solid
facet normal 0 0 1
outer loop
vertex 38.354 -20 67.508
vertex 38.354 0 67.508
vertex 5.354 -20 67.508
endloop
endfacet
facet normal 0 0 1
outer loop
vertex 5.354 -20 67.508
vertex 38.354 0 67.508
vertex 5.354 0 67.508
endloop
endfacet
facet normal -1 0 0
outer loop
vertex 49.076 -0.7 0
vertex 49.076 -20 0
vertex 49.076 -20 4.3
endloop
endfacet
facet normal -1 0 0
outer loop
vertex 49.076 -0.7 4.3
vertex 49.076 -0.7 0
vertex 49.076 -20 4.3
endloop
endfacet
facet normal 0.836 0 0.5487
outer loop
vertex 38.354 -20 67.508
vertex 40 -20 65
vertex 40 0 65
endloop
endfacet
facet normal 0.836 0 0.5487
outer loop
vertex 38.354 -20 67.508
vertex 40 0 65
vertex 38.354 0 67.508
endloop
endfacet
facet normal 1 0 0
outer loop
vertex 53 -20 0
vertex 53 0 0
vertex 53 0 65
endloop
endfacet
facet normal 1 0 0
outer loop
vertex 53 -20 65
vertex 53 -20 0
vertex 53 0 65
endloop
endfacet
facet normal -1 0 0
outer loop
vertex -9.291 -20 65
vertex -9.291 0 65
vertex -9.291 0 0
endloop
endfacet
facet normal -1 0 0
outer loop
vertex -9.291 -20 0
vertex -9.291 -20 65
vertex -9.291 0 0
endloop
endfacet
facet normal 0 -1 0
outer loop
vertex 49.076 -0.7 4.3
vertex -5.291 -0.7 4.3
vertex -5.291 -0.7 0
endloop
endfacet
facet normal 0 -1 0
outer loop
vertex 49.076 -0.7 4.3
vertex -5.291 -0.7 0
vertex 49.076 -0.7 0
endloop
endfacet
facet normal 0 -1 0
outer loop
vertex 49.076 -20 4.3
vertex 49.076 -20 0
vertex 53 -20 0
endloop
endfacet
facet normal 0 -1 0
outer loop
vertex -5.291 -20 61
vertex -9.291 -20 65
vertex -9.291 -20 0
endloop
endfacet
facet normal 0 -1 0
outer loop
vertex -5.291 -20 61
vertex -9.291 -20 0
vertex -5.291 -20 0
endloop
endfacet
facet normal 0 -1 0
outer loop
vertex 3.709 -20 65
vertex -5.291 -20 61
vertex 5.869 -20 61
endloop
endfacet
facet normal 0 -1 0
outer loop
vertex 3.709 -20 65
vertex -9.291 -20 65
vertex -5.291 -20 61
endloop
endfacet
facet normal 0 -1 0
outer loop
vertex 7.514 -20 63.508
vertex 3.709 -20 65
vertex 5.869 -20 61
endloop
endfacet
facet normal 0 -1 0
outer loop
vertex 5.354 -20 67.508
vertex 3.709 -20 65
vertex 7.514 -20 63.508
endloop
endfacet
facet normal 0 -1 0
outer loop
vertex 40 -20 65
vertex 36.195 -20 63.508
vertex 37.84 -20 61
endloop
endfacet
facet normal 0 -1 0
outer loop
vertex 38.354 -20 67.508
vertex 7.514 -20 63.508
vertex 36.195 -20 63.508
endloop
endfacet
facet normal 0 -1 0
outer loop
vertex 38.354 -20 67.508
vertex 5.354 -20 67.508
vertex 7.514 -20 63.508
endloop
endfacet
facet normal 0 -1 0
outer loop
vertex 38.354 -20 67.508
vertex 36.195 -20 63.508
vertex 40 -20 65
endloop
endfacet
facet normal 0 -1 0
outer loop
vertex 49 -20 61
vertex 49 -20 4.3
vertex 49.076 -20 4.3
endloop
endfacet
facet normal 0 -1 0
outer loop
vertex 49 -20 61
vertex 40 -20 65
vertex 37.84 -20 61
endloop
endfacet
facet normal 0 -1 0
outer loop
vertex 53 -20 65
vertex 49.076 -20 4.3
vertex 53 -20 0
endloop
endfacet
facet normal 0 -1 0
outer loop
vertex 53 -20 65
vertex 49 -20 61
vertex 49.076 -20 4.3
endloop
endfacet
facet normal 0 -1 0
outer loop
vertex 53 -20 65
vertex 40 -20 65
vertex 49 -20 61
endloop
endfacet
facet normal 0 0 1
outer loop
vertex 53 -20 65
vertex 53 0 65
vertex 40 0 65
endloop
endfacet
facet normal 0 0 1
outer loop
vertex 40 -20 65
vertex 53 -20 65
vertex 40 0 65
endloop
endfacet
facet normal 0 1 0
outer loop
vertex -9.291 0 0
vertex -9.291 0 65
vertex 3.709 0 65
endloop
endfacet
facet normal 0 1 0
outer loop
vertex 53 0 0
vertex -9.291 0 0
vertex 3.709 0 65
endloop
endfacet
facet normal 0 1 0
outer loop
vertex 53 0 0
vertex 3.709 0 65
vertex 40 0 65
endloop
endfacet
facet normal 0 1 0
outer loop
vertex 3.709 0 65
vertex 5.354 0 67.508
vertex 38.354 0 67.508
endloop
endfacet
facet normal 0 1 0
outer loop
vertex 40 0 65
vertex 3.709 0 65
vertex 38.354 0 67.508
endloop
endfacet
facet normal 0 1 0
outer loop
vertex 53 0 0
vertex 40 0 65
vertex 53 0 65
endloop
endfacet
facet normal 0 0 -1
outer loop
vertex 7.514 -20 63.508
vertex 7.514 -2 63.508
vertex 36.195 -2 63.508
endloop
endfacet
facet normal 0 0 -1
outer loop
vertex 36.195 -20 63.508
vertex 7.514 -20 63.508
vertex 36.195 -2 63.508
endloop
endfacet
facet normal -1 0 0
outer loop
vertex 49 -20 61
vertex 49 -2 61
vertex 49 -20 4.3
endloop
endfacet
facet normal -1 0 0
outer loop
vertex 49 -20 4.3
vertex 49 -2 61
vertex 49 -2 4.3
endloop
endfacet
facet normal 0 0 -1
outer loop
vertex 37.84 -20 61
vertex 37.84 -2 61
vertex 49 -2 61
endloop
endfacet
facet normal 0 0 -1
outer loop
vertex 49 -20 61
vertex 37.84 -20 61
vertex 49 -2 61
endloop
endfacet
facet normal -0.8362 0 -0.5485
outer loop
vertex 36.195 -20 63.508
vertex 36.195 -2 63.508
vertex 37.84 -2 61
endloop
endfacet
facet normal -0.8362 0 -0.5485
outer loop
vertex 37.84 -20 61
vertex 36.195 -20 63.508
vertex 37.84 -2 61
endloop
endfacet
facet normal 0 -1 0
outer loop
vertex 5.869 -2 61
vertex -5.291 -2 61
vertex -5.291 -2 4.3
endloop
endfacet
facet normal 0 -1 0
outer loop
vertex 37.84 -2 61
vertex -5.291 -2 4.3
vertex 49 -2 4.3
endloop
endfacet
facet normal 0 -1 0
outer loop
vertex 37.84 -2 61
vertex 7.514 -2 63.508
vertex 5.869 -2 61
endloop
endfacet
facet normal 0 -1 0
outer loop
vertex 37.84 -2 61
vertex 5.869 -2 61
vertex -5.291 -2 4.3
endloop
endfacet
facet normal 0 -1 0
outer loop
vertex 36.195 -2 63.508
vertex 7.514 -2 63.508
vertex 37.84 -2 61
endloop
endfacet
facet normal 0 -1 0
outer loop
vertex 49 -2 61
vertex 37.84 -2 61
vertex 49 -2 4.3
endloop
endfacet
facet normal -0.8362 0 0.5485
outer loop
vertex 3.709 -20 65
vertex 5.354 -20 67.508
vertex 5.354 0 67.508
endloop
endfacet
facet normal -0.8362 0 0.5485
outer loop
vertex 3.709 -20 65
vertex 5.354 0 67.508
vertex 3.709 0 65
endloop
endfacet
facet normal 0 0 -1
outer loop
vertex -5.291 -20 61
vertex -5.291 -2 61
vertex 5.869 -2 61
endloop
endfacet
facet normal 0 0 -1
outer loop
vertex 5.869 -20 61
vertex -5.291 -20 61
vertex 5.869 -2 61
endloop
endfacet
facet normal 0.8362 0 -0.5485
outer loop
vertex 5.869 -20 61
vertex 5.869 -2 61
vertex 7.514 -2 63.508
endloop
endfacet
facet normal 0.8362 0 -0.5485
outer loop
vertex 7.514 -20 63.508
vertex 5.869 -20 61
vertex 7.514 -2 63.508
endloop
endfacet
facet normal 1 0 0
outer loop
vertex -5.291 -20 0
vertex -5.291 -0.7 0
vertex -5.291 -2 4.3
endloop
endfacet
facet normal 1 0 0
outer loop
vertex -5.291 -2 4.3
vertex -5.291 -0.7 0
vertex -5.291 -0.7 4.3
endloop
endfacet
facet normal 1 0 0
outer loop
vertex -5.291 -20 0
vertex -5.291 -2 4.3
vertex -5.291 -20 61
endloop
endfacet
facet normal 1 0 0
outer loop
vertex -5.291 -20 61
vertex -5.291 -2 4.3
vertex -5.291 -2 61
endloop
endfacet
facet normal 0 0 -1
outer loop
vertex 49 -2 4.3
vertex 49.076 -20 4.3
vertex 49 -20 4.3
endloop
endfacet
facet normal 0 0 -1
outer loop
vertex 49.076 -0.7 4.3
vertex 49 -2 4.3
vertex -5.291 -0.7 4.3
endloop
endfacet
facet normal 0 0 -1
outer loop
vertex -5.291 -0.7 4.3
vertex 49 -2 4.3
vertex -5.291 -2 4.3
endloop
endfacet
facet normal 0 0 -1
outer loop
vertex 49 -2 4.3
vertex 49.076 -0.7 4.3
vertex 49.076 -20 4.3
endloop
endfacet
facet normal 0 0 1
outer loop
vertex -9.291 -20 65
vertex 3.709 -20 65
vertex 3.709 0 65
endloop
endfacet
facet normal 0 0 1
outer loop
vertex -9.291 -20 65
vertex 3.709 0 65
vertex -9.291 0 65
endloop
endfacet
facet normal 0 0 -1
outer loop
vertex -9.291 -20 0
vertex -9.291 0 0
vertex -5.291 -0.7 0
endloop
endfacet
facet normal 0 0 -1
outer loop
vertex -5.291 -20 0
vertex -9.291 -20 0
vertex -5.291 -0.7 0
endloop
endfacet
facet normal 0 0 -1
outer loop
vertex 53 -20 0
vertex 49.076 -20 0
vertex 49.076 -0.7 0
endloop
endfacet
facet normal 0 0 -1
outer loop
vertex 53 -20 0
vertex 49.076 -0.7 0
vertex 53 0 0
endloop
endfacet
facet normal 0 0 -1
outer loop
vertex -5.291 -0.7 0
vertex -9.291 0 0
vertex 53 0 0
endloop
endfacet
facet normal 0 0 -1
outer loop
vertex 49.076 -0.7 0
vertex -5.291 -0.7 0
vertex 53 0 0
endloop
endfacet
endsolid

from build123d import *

# Parameters (mm, degrees)
F2_DEPTH  = 2
F0_W      = 4
F0_H      = 4
F0_H_2    = 57
F3_DEPTH  = 20
F3_FACE_W = 62.291004
F3_FACE_H = 20
F4_DEPTH  = 4.3
F5_DEPTH  = 4
F7_DEPTH  = 19.3


with BuildPart() as f2:
    # F0 (on Front) → F2 (new body)
    with BuildSketch(Plane.XZ):
        Polygon((-5.291004, 61), (-5.291004, 4), (0, 4), (49, 4), (49, 61), (37.840104, 61), (36.194602, 63.50845), (7.514394, 63.50845), (5.868892, 61), align=None)
    extrude(amount=F2_DEPTH)

    # F0 (on Front) → F3 (join)
    with BuildSketch(Plane.XZ):
        Polygon((-5.291004, 0), (0, 0), (53, 0), (53, 65), (40, 65), (38.354498, 67.50845), (5.354498, 67.50845), (3.708996, 65), (-5.291004, 65), (-5.291004, 61), (5.868892, 61), (7.514394, 63.50845), (36.194602, 63.50845), (37.840104, 61), (49, 61), (49, 4), (0, 4), (-5.291004, 4), align=None)
        with Locations((-7.291004, 2)):
            Rectangle(F0_W, F0_H)
        with Locations((-7.291004, 32.5)):
            Rectangle(F0_W, F0_H_2)
        with Locations((-7.291004, 63)):
            Rectangle(F0_W, F0_H)
    extrude(amount=F3_DEPTH)

    # F3_face (on face) → F4 (join)
    with BuildSketch(Plane(origin=(21.854498, -10, 0), x_dir=(1, 0, 0), z_dir=(0, 0, -1))):
        Rectangle(F3_FACE_W, F3_FACE_H)
    extrude(amount=-F4_DEPTH)

    # F3_face (on face) → F5 (join)
    with BuildSketch(Plane(origin=(21.854498, -10, 0), x_dir=(1, 0, 0), z_dir=(0, 0, -1))):
        Rectangle(F3_FACE_W, F3_FACE_H)
    extrude(amount=-F5_DEPTH)

    # F6 (on face) → F7 (cut)
    with BuildSketch(Plane.XZ.offset(20)):
        Polygon((49, 4.3), (-5.291004, 4.3), (-5.291004, 0), (49.075996, 0), (49.075996, 4.3), align=None)
    extrude(amount=-F7_DEPTH, mode=Mode.SUBTRACT)


solid = f2.part
